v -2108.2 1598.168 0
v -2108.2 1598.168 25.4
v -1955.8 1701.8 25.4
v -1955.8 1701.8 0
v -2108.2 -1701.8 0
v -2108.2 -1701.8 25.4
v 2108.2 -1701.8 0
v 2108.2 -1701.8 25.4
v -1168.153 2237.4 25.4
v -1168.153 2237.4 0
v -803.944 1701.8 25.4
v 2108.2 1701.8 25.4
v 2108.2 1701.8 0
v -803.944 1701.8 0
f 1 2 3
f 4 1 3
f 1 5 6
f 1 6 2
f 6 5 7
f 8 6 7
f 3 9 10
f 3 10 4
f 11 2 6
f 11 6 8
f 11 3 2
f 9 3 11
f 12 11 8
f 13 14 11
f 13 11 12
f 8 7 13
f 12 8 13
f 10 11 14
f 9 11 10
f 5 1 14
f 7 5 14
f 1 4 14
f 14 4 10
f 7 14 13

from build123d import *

# Parameters (mm, degrees)
F0_W     = 4216.4
F0_H     = 3403.6
F1_DEPTH = 25.4
F3_DEPTH = 25.4
F5_DEPTH = 25.4


with BuildPart() as f1:
    # F0 (on Top) → F1 (new body)
    with BuildSketch(Plane.XY):
        Rectangle(F0_W, F0_H)
    extrude(amount=F1_DEPTH)

    # F2 (on face) → F3 (join)
    with BuildSketch(Plane.XY.offset(25.4)):
        Polygon((-1168.1525067788, 2237.4002953904), (-1955.8, 1701.8), (-803.9443059133, 1701.8), align=None)
    extrude(amount=-F3_DEPTH)

    # F4 (on face) → F5 (cut)
    with BuildSketch(Plane.XY.offset(25.4)):
        Polygon((-2108.2, 1598.1680001262), (-1955.8, 1701.8), (-2108.2, 1701.8), align=None)
    extrude(amount=-F5_DEPTH, mode=Mode.SUBTRACT)


solid = f1.part
